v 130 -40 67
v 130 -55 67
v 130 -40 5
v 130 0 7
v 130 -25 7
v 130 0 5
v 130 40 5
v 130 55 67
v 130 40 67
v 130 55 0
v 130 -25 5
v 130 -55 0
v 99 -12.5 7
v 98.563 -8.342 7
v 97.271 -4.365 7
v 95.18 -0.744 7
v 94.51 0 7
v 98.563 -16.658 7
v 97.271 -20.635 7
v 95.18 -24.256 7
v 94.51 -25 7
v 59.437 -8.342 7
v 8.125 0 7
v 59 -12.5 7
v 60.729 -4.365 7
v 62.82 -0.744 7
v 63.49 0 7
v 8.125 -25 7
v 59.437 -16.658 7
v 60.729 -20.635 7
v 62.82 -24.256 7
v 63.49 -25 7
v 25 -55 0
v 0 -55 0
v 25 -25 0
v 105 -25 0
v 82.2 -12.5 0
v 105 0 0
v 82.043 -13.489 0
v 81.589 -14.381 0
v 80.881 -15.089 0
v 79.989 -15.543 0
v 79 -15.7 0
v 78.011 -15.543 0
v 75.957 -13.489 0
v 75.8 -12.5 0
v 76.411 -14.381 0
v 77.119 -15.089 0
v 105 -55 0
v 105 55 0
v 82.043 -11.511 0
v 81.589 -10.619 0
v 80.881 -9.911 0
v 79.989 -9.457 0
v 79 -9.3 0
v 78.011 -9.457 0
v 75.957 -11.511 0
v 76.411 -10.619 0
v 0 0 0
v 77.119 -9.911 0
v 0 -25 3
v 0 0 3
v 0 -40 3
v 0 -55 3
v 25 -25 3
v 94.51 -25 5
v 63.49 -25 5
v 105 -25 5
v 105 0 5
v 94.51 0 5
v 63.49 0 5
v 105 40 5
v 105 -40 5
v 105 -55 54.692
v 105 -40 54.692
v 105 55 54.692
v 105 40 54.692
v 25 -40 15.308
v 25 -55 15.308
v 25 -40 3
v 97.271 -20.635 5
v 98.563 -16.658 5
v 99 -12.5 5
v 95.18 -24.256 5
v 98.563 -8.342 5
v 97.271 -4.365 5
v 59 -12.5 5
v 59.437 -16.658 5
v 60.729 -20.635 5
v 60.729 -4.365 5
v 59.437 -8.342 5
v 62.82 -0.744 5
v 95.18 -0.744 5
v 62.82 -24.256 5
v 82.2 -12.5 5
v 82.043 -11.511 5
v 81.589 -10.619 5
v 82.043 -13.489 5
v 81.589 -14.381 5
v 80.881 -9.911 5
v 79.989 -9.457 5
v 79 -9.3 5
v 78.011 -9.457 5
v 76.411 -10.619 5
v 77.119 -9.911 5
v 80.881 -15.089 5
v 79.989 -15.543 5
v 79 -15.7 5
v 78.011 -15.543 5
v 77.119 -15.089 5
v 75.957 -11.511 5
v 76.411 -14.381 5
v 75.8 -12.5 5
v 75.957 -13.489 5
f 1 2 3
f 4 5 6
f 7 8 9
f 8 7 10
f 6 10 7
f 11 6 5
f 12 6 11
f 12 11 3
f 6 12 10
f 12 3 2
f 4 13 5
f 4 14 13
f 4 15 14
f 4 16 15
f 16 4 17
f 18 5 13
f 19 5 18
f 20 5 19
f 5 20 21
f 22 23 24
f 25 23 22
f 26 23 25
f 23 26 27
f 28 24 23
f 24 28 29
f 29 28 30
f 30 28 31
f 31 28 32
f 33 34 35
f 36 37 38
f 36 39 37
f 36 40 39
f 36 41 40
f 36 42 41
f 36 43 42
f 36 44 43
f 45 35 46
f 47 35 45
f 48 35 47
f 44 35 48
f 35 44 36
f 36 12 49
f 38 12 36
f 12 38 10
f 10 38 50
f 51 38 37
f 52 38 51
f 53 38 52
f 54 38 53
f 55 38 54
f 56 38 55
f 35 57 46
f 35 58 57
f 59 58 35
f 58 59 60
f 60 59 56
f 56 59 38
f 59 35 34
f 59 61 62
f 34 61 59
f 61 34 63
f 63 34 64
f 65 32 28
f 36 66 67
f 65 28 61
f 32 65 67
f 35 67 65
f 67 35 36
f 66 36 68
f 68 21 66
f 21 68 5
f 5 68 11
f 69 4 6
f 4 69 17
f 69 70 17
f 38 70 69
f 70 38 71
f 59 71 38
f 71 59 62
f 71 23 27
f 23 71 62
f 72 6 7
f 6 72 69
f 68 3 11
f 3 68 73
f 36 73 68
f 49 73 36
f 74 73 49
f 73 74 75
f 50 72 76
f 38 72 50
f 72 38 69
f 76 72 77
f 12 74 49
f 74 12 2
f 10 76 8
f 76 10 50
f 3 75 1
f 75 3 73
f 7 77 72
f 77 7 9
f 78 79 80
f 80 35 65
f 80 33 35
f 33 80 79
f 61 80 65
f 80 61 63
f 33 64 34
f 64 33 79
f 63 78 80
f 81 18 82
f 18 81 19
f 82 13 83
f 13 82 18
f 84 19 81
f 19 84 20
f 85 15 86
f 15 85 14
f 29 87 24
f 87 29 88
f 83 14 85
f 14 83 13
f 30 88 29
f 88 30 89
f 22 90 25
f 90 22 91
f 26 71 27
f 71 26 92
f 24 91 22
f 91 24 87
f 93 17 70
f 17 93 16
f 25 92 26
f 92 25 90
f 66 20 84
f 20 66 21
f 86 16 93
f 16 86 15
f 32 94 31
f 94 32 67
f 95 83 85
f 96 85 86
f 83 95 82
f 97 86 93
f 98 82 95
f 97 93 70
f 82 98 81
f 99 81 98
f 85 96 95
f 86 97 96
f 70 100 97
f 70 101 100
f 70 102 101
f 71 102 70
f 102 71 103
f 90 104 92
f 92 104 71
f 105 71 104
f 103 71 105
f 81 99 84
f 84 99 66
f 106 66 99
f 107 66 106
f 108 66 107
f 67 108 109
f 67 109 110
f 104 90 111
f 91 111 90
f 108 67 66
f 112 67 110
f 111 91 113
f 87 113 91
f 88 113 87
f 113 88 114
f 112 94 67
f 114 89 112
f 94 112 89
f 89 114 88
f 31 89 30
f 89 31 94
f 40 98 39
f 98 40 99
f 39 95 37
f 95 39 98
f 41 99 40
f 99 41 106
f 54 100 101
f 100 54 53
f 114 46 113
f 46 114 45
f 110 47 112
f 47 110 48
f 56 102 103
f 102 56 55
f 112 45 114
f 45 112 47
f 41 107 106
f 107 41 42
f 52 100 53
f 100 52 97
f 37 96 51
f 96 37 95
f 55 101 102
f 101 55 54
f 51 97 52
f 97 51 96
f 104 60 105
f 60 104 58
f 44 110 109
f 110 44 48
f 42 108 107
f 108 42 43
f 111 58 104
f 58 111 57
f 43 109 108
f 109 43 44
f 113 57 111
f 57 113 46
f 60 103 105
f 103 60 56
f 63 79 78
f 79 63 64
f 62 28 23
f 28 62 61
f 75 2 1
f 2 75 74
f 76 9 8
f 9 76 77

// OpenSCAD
// "lengths" are x, "widths" are y, "heights" are z
// orientations assume looking along Z axis from pos to neg, with y axis at bottom, ie
// "left" is positive-y, "right" is negative-y, "upper" is positive-x, "lower" is negative-x

build_for_left_keyboard_half = 1; // 0 or 1, mirrors model

// for flashforge creator x, keep this <=130-140
total_length=130;

// How high to tent the middle, in millimeters
tent_height=64;
tent_angle=atan2(tent_height, total_length);
// Alternately, the angle to tent at, in degrees
//tent_angle=45;

// How wide to make the baseplates
base_center_bar_width=25; // [10:40] 
base_center_bar_height=7; // must be >5 for the screw to properly tighten

thumbscrew_offset_length=79;

// How far apart to spread the 'wings'
// right is negative direction, left is positive
tower_offset_left=30; // [0:100]
tower_offset_right=55;

tower_width=15; // [10:30]
tower_length=25;
tower_height=200;

// for flashforge creator x, keep this <= 110 or so
total_width=tower_offset_left + base_center_bar_width + tower_offset_right;

mirror([0,build_for_left_keyboard_half,0])
difference() {
    union() {
        // base center bar (where thumbscrew goes)
        cube([
            total_length,
            base_center_bar_width,
            base_center_bar_height]);
        
        // upper tower base plate
        translate([
            total_length - tower_length,
            -tower_offset_right,
            0])
        cube([
            tower_length,
            total_width,
            5]);
        
        // upper-left tower
        translate([
            total_length - tower_length,
            tower_offset_left + base_center_bar_width - tower_width,
            0])
        cube([
            tower_length,
            tower_width,
            tower_height]);
            
        // upper-right tower
        translate([
            total_length - tower_length,
            -tower_offset_right,
            0])
        cube([
            tower_length,
            tower_width,
            tower_height]);

        // lower tower base plate
        translate([
            25 - tower_length,
            0, // -tower_offset_right to include lower-right tower
            0])
        cube([
            tower_length,
            tower_offset_left + base_center_bar_width,
            3]);

        // lower-left tower
        translate([
            25 - tower_length,
            tower_offset_left + base_center_bar_width - tower_width,
            0])
        cube([
            tower_length,
            tower_width,
            tower_height]);
            
        // lower-right tower
        // We omit this because the keyboard has a foot in the same spot that serves this purpose instead
        /*
        translate([
            25 - tower_length,
            -tower_offset_right,
            0])
        cube([
            tower_length,
            tower_width,
            tower_height]);
        */

    }
    
    // thumbscrew gap
    translate([
        thumbscrew_offset_length,
        base_center_bar_width/2,
        5])
    cylinder(r1=20,r2=20,h=25);

    // mounting screwhole
    translate([
        thumbscrew_offset_length,
        base_center_bar_width/2,
        -1])
    cylinder(r=3.2,h=20,$fn=20);
    
    // top wedge
    translate([
        0,
        -tower_offset_right - 1,
        3])
    rotate([0,-tent_angle,0])
    cube([
        total_length * 2,
        total_width + 2,
        500]);
}
